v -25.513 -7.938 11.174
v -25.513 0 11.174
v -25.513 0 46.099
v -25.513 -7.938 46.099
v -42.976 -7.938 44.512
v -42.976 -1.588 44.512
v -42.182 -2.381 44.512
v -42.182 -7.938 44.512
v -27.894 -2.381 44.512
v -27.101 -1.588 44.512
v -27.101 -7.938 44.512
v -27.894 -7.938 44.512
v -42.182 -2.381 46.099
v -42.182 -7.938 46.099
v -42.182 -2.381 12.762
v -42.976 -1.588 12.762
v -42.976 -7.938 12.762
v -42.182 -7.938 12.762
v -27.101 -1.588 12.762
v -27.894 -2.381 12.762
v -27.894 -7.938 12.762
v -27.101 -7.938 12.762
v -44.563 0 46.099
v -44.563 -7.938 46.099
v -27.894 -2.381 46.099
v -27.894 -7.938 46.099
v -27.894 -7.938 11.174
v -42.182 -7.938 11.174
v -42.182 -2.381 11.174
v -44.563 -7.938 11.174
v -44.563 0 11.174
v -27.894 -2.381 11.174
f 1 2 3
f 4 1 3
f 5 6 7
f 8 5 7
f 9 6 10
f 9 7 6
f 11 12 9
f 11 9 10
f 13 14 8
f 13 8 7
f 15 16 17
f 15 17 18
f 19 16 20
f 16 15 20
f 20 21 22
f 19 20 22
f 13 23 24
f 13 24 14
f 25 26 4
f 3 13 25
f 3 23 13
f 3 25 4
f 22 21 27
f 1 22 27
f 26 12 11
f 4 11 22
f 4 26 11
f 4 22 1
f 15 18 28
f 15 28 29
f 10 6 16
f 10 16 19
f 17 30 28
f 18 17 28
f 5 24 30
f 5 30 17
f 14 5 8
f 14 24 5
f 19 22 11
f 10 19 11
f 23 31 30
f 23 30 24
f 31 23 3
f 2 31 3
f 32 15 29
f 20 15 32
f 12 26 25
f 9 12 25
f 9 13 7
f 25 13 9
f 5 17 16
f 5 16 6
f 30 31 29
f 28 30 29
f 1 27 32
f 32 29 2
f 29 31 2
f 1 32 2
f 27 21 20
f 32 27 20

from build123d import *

# Parameters (mm, degrees)
F0_W     = 19.05
F0_H     = 34.925
F1_DEPTH = 7.9375
F2_W     = 15.875
F2_H     = 31.75
F3_DEPTH = 6.35
F4_W     = 14.2875
F4_H     = 5.55625
F5_DEPTH = 34.926


with BuildPart() as f1:
    # F0 (on Front) → F1 (new body)
    with BuildSketch(Plane.XZ):
        with Locations((-35.038067, 28.636673)):
            Rectangle(F0_W, F0_H)
    extrude(amount=F1_DEPTH)

    # F2 (on face) → F3 (cut)
    with BuildSketch(Plane.XZ.offset(7.9375)):
        with Locations((-35.038067, 28.636673)):
            Rectangle(F2_W, F2_H)
    extrude(amount=-F3_DEPTH, mode=Mode.SUBTRACT)

    # F4 (on face) → F5 (cut, through all)
    with BuildSketch(Plane.XY.offset(46.099173)):
        with Locations((-35.038067, -5.159375)):
            Rectangle(F4_W, F4_H)
    extrude(amount=-F5_DEPTH, mode=Mode.SUBTRACT)


solid = f1.part
